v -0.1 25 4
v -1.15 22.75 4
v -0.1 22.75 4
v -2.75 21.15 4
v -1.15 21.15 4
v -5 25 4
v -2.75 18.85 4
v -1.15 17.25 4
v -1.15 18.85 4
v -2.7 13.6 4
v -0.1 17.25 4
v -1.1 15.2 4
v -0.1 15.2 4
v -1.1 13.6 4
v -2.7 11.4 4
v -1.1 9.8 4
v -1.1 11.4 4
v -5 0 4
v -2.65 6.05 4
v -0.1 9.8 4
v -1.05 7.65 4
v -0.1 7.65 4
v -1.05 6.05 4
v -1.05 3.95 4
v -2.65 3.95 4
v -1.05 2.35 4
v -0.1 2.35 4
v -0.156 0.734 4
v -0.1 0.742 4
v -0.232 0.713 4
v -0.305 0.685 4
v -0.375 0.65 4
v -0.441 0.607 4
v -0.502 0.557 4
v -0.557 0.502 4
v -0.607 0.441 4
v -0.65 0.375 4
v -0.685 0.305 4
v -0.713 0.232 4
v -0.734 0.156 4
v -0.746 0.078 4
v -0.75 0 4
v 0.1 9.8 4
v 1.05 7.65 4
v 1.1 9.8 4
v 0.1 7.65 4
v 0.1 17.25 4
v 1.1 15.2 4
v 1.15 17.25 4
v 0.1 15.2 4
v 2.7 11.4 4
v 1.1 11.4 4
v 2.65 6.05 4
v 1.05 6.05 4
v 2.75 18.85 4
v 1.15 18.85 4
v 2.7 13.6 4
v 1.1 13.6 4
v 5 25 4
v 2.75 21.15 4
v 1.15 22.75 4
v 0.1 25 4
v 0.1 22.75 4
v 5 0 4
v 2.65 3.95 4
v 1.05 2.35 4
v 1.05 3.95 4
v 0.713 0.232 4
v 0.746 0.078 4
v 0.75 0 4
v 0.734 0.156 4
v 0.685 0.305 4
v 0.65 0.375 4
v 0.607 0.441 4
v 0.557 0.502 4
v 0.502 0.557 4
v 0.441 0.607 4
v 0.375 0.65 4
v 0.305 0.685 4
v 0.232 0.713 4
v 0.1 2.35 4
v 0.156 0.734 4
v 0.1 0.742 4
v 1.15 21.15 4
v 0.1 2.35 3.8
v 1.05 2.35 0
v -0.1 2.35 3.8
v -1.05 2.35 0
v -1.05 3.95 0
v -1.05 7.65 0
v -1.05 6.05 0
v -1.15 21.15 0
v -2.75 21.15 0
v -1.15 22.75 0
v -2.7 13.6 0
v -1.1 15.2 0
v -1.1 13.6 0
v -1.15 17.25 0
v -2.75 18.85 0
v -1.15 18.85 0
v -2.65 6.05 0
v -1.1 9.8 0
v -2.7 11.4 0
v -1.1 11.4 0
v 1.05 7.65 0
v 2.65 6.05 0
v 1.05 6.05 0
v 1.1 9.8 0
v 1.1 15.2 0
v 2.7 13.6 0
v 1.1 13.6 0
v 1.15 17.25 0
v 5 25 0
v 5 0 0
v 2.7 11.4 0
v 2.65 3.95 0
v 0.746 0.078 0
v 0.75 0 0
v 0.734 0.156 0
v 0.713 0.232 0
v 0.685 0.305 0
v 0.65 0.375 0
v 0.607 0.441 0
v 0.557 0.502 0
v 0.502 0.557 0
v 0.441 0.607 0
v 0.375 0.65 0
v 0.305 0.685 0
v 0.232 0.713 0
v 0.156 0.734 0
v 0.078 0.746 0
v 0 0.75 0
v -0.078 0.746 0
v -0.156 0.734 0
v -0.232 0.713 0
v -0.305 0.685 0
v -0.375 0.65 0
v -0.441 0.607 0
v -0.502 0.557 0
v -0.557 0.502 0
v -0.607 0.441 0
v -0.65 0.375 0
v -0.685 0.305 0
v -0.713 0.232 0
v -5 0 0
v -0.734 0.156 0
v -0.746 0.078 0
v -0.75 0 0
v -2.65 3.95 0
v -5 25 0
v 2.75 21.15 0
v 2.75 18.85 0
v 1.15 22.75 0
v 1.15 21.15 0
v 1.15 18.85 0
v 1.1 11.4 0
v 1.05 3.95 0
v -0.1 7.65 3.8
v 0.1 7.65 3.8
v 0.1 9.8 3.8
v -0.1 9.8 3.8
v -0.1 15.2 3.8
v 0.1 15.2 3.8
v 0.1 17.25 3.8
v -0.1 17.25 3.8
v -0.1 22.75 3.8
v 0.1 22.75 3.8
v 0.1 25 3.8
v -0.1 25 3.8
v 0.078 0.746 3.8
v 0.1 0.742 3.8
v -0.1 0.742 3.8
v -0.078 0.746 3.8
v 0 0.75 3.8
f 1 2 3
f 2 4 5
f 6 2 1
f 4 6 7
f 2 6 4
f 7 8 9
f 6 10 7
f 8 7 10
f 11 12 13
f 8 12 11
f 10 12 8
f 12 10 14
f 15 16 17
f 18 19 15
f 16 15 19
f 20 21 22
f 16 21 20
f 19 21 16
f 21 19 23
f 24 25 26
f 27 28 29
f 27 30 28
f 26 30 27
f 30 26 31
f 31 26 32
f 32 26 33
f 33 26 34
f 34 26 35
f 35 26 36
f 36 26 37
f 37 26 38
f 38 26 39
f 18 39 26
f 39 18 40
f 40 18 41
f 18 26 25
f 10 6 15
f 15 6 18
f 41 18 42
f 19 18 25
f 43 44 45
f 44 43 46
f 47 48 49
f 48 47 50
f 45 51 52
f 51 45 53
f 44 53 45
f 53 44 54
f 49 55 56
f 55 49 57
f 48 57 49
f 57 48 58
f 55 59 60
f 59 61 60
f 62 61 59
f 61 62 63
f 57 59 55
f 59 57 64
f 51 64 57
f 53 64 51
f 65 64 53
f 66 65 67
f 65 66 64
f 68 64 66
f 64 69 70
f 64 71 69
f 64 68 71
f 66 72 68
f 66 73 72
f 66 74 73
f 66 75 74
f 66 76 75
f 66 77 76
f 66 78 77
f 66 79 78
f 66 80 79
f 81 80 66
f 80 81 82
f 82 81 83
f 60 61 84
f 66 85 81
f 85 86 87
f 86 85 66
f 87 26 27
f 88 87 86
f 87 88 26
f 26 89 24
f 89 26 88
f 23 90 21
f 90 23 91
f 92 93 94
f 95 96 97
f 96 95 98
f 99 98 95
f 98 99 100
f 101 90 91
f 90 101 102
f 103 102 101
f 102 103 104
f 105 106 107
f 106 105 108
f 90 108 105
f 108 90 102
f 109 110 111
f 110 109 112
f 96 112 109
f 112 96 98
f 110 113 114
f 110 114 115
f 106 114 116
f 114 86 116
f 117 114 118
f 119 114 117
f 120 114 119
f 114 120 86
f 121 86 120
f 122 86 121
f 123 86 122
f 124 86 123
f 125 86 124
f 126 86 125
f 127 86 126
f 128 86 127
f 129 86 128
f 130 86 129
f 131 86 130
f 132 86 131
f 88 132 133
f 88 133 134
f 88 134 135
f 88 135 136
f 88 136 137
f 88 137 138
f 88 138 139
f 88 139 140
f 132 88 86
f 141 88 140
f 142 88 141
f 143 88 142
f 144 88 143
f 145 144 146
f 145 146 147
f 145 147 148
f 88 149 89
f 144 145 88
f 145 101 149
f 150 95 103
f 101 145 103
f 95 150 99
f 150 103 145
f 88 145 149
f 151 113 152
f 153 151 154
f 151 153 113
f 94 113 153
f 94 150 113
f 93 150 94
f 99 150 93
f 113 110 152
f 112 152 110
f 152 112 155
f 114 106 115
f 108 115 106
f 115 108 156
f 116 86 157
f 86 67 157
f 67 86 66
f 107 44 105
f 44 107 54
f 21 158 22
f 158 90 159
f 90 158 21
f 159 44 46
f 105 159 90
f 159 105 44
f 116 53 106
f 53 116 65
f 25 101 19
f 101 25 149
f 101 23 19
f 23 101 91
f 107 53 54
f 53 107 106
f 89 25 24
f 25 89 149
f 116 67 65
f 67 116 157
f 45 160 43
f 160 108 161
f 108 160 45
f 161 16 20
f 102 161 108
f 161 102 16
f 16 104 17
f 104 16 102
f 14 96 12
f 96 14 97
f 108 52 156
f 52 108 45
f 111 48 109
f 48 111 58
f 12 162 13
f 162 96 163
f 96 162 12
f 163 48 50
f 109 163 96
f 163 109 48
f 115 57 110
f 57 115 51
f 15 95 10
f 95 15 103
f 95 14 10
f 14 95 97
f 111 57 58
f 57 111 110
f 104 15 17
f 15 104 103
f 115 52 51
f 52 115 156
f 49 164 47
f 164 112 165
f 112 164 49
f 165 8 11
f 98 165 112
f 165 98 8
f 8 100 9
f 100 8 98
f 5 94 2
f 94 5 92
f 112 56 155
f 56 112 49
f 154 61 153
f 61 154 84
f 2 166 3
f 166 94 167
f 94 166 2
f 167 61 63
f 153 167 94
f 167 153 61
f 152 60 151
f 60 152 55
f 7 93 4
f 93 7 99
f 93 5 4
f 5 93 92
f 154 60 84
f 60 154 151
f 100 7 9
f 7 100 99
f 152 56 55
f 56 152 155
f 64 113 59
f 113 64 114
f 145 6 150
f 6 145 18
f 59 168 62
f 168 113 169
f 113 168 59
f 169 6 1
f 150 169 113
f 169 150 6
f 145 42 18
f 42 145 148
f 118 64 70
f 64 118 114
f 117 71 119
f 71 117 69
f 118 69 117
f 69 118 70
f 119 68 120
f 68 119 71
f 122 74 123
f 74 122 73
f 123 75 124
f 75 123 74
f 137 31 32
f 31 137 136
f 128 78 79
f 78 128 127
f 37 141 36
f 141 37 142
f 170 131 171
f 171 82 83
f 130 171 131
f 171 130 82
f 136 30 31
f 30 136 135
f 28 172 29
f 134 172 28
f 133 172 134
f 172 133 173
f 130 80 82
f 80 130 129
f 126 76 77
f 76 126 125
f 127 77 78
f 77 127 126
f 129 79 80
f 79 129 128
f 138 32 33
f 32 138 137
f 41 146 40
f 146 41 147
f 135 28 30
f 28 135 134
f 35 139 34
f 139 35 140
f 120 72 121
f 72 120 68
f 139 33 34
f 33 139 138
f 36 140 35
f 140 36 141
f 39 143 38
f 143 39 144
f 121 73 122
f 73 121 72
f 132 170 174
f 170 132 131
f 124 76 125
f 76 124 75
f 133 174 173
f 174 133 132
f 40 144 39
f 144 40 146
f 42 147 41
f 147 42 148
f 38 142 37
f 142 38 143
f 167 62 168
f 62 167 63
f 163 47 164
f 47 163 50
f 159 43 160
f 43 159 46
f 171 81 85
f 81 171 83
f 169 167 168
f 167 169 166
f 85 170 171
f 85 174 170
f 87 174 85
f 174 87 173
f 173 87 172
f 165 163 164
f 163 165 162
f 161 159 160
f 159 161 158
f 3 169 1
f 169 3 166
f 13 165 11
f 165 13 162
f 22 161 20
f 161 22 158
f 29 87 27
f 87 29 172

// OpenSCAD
// file: def-servo-lego-geekservo.scad
// Lego Geekservo 180°

SERVO_BODY_LENGTH = 24.1 -.4;
SERVO_BODY_WIDTH = 16.2 - .4;
SERVO_BODY_HEIGHT = 28.9 -.3;

SERVO_AXIS_RADIUS = 3;

SERVO_OFFSET_X = -8.5 +.75;  // crucial for proper centering of servo axis

SERVO_TAB_WIDTH_EXCESS_1 = 8;
SERVO_TAB_WIDTH_EXCESS_2 = 8;
SERVO_TAB_HEIGHT = 11.4;
SERVO_TAB_OFFSET_Z = -19.3;
SERVO_TAB_BOTTOM_TO_HORN_HEIGHT = 25;

SERVO_HORN_DIAMETER = 0;
SERVO_HORN_HEIGHT = 0;

HORN_CROSS_WIDTH = 5;
HORN_ARM_THICKNESS = 1.8;

//
// SERVO SCREWS
//

SERVO_SCREW1_H_DISPLACEMENT = 20.5 -.1  +6.5 -4.5;
SERVO_SCREW2_H_DISPLACEMENT = -9 +.1 -1.9  -4.5 +1;
SERVO_SCREW_HEAD_EXTENT = -SERVO_TAB_OFFSET_Z;
SERVO_SCREW_IS_HEADLESS = true;

// Cube
CUBE_SIZE_EXTRA = 0;
// file: definitions.scad
//
// GENERAL
//

//$fn = 96;
$fn = 180;

PLAY = 0.35; //0.40
TOLERANCE = 0.12; //0.17
SPACING = 0.5;
ATOM = 0.01;
WALL_THICKNESS = 1;

CHAMFER = 0.75;

//
// SERVO
//

//include <def-servo-mc-1811.scad>
include <def-servo-lego-geekservo.scad>

SERVO_TOTAL_HEIGHT = SERVO_BODY_HEIGHT + SERVO_TAB_OFFSET_Z + SERVO_TAB_BOTTOM_TO_HORN_HEIGHT;
echo("SERVO_TOTAL_HEIGHT", SERVO_TOTAL_HEIGHT);

//
// CUBE
//

CUBE_HEIGHT = 54 + CUBE_SIZE_EXTRA;
CUBE_WIDTH  = 54 + CUBE_SIZE_EXTRA;
echo("CUBE_WIDTH", CUBE_WIDTH);

CUBE_RAISE = 6 +4;
CUBE_WALL_THICKNESS = 1;

SPACING_SMALL = ceil(sqrt(2) * CUBE_WIDTH/2) + CUBE_WIDTH/2 + 4;
SPACING_CENTRAL = 45;

echo("SPACING_SMALL", SPACING_SMALL);


//
// CAVITY
//

SERVO_CABLE_CAVITY_THICKNESS = 5;
SERVO_CABLE_CAVITY_WIDTH = 12;
SERVO_CABLE_CAVITY_OFFSET_FROM_BORDER = 2.5;


SERVO_BODY_CAVITY_OFFSET_X = 3;
SERVO_BODY_CAVITY_OFFSET_Y = 8;
SERVO_CAVITY_BOTTOM_EXTENT = 50;


//
// GENERIC SCREW
//

SCREW2_DIAMETER = 2.4; //2.2
SCREW2_HEAD_DIAMETER = 5.5;
SCREW2_HEAD_THICKNESS = 2;
SCREW2_HEIGHT = 11; //12*2; // overall


//
// SUPPORT - BOTTOM
//

SUPPORT_DIAMETER = CUBE_WIDTH - (CUBE_WALL_THICKNESS + SPACING + TOLERANCE)*2;
echo("SUPPORT_DIAMETER", SUPPORT_DIAMETER);
SERVO_TOP_TO_CUBE_MARGIN = 4;


//
// BASE
//

BASE_LENGTH = SPACING_SMALL*3 + SPACING_CENTRAL+CUBE_WIDTH;
BASE_HEIGHT = 20;


//
// HELPERS
//

module screw(head_extent=0, is_clearance_hole=false, is_headless=false) {   
    // thread
    translate([0, 0, -SCREW2_HEIGHT + SCREW2_HEAD_THICKNESS]) {
        cylinder(h=SCREW2_HEIGHT,
                 r=SCREW2_DIAMETER/2 - TOLERANCE
                   + (is_clearance_hole ? TOLERANCE*2 : 0));

        h = SCREW2_HEIGHT - SCREW2_HEAD_THICKNESS*1 - 0.2;
        w = TOLERANCE / 3;

        translate([0, 0, h/2]) {
            rotate([0, 0, 0])
            cube([SCREW2_DIAMETER*1.1, w, h], center=true);

            rotate([0, 0, -60])
            cube([SCREW2_DIAMETER*2.2, w, h], center=true);

            rotate([0, 0, 60])
            cube([SCREW2_DIAMETER*2.2, w, h], center=true);

            rotate([0, 0, 90])
            cube([SCREW2_DIAMETER*3.0, w, h], center=true);
        }
    }

    // head
    screw_r = (is_headless ? SCREW2_DIAMETER/2 : SCREW2_HEAD_DIAMETER/2) + (is_clearance_hole ? PLAY : 0);
    for (i=[0:head_extent])
        translate([0, 0, i])
        cylinder(h=SCREW2_HEAD_THICKNESS, 
                 r=screw_r);
}

module flip(height, additional_angle=0) {
        translate([0, 0, height])
        rotate([180, 0, 90-additional_angle])
        children();
}
// main file
include <definitions.scad>

$fn = 60;

module cross(d, h) {
    rotate([0, 0, 90])
    translate([-HORN_CROSS_WIDTH/2-d/2, -HORN_ARM_THICKNESS/2-d/2, 0])
    cube([HORN_CROSS_WIDTH+d, HORN_ARM_THICKNESS+d, h]);

    translate([-HORN_CROSS_WIDTH/2-d/2, -HORN_ARM_THICKNESS/2-d/2, 0])
    cube([HORN_CROSS_WIDTH+d, HORN_ARM_THICKNESS+d, h]);
}

module calibrator() {
    difference() {
        cylinder(r=HORN_CROSS_WIDTH*1.5, h=2);
        for (i=[0:3]) {
            d = (i+2)/10;
            echo("d", d);
            
            translate([0, 0, i/2])
            cross(d, 0.5);
        }
    }
}

module test() {
    h = 4;
    difference() {
        translate([-HORN_CROSS_WIDTH, -HORN_CROSS_WIDTH*0, 0])
        cube([HORN_CROSS_WIDTH*2, HORN_CROSS_WIDTH*5, h]);
        
        cylinder(d=1.5, h=h);
        translate([0, HORN_CROSS_WIDTH*1, 0])
        cross(.3, h);
    
        translate([0, HORN_CROSS_WIDTH*2.5, 0])
        cross(.4, h);

        translate([0, HORN_CROSS_WIDTH*4, 0])
        cross(.5, h);
        
        translate([-.2/2, 0, h-.2])
        cube([.2, HORN_CROSS_WIDTH*5, h]);
    }
}


//calibrator();

test();
